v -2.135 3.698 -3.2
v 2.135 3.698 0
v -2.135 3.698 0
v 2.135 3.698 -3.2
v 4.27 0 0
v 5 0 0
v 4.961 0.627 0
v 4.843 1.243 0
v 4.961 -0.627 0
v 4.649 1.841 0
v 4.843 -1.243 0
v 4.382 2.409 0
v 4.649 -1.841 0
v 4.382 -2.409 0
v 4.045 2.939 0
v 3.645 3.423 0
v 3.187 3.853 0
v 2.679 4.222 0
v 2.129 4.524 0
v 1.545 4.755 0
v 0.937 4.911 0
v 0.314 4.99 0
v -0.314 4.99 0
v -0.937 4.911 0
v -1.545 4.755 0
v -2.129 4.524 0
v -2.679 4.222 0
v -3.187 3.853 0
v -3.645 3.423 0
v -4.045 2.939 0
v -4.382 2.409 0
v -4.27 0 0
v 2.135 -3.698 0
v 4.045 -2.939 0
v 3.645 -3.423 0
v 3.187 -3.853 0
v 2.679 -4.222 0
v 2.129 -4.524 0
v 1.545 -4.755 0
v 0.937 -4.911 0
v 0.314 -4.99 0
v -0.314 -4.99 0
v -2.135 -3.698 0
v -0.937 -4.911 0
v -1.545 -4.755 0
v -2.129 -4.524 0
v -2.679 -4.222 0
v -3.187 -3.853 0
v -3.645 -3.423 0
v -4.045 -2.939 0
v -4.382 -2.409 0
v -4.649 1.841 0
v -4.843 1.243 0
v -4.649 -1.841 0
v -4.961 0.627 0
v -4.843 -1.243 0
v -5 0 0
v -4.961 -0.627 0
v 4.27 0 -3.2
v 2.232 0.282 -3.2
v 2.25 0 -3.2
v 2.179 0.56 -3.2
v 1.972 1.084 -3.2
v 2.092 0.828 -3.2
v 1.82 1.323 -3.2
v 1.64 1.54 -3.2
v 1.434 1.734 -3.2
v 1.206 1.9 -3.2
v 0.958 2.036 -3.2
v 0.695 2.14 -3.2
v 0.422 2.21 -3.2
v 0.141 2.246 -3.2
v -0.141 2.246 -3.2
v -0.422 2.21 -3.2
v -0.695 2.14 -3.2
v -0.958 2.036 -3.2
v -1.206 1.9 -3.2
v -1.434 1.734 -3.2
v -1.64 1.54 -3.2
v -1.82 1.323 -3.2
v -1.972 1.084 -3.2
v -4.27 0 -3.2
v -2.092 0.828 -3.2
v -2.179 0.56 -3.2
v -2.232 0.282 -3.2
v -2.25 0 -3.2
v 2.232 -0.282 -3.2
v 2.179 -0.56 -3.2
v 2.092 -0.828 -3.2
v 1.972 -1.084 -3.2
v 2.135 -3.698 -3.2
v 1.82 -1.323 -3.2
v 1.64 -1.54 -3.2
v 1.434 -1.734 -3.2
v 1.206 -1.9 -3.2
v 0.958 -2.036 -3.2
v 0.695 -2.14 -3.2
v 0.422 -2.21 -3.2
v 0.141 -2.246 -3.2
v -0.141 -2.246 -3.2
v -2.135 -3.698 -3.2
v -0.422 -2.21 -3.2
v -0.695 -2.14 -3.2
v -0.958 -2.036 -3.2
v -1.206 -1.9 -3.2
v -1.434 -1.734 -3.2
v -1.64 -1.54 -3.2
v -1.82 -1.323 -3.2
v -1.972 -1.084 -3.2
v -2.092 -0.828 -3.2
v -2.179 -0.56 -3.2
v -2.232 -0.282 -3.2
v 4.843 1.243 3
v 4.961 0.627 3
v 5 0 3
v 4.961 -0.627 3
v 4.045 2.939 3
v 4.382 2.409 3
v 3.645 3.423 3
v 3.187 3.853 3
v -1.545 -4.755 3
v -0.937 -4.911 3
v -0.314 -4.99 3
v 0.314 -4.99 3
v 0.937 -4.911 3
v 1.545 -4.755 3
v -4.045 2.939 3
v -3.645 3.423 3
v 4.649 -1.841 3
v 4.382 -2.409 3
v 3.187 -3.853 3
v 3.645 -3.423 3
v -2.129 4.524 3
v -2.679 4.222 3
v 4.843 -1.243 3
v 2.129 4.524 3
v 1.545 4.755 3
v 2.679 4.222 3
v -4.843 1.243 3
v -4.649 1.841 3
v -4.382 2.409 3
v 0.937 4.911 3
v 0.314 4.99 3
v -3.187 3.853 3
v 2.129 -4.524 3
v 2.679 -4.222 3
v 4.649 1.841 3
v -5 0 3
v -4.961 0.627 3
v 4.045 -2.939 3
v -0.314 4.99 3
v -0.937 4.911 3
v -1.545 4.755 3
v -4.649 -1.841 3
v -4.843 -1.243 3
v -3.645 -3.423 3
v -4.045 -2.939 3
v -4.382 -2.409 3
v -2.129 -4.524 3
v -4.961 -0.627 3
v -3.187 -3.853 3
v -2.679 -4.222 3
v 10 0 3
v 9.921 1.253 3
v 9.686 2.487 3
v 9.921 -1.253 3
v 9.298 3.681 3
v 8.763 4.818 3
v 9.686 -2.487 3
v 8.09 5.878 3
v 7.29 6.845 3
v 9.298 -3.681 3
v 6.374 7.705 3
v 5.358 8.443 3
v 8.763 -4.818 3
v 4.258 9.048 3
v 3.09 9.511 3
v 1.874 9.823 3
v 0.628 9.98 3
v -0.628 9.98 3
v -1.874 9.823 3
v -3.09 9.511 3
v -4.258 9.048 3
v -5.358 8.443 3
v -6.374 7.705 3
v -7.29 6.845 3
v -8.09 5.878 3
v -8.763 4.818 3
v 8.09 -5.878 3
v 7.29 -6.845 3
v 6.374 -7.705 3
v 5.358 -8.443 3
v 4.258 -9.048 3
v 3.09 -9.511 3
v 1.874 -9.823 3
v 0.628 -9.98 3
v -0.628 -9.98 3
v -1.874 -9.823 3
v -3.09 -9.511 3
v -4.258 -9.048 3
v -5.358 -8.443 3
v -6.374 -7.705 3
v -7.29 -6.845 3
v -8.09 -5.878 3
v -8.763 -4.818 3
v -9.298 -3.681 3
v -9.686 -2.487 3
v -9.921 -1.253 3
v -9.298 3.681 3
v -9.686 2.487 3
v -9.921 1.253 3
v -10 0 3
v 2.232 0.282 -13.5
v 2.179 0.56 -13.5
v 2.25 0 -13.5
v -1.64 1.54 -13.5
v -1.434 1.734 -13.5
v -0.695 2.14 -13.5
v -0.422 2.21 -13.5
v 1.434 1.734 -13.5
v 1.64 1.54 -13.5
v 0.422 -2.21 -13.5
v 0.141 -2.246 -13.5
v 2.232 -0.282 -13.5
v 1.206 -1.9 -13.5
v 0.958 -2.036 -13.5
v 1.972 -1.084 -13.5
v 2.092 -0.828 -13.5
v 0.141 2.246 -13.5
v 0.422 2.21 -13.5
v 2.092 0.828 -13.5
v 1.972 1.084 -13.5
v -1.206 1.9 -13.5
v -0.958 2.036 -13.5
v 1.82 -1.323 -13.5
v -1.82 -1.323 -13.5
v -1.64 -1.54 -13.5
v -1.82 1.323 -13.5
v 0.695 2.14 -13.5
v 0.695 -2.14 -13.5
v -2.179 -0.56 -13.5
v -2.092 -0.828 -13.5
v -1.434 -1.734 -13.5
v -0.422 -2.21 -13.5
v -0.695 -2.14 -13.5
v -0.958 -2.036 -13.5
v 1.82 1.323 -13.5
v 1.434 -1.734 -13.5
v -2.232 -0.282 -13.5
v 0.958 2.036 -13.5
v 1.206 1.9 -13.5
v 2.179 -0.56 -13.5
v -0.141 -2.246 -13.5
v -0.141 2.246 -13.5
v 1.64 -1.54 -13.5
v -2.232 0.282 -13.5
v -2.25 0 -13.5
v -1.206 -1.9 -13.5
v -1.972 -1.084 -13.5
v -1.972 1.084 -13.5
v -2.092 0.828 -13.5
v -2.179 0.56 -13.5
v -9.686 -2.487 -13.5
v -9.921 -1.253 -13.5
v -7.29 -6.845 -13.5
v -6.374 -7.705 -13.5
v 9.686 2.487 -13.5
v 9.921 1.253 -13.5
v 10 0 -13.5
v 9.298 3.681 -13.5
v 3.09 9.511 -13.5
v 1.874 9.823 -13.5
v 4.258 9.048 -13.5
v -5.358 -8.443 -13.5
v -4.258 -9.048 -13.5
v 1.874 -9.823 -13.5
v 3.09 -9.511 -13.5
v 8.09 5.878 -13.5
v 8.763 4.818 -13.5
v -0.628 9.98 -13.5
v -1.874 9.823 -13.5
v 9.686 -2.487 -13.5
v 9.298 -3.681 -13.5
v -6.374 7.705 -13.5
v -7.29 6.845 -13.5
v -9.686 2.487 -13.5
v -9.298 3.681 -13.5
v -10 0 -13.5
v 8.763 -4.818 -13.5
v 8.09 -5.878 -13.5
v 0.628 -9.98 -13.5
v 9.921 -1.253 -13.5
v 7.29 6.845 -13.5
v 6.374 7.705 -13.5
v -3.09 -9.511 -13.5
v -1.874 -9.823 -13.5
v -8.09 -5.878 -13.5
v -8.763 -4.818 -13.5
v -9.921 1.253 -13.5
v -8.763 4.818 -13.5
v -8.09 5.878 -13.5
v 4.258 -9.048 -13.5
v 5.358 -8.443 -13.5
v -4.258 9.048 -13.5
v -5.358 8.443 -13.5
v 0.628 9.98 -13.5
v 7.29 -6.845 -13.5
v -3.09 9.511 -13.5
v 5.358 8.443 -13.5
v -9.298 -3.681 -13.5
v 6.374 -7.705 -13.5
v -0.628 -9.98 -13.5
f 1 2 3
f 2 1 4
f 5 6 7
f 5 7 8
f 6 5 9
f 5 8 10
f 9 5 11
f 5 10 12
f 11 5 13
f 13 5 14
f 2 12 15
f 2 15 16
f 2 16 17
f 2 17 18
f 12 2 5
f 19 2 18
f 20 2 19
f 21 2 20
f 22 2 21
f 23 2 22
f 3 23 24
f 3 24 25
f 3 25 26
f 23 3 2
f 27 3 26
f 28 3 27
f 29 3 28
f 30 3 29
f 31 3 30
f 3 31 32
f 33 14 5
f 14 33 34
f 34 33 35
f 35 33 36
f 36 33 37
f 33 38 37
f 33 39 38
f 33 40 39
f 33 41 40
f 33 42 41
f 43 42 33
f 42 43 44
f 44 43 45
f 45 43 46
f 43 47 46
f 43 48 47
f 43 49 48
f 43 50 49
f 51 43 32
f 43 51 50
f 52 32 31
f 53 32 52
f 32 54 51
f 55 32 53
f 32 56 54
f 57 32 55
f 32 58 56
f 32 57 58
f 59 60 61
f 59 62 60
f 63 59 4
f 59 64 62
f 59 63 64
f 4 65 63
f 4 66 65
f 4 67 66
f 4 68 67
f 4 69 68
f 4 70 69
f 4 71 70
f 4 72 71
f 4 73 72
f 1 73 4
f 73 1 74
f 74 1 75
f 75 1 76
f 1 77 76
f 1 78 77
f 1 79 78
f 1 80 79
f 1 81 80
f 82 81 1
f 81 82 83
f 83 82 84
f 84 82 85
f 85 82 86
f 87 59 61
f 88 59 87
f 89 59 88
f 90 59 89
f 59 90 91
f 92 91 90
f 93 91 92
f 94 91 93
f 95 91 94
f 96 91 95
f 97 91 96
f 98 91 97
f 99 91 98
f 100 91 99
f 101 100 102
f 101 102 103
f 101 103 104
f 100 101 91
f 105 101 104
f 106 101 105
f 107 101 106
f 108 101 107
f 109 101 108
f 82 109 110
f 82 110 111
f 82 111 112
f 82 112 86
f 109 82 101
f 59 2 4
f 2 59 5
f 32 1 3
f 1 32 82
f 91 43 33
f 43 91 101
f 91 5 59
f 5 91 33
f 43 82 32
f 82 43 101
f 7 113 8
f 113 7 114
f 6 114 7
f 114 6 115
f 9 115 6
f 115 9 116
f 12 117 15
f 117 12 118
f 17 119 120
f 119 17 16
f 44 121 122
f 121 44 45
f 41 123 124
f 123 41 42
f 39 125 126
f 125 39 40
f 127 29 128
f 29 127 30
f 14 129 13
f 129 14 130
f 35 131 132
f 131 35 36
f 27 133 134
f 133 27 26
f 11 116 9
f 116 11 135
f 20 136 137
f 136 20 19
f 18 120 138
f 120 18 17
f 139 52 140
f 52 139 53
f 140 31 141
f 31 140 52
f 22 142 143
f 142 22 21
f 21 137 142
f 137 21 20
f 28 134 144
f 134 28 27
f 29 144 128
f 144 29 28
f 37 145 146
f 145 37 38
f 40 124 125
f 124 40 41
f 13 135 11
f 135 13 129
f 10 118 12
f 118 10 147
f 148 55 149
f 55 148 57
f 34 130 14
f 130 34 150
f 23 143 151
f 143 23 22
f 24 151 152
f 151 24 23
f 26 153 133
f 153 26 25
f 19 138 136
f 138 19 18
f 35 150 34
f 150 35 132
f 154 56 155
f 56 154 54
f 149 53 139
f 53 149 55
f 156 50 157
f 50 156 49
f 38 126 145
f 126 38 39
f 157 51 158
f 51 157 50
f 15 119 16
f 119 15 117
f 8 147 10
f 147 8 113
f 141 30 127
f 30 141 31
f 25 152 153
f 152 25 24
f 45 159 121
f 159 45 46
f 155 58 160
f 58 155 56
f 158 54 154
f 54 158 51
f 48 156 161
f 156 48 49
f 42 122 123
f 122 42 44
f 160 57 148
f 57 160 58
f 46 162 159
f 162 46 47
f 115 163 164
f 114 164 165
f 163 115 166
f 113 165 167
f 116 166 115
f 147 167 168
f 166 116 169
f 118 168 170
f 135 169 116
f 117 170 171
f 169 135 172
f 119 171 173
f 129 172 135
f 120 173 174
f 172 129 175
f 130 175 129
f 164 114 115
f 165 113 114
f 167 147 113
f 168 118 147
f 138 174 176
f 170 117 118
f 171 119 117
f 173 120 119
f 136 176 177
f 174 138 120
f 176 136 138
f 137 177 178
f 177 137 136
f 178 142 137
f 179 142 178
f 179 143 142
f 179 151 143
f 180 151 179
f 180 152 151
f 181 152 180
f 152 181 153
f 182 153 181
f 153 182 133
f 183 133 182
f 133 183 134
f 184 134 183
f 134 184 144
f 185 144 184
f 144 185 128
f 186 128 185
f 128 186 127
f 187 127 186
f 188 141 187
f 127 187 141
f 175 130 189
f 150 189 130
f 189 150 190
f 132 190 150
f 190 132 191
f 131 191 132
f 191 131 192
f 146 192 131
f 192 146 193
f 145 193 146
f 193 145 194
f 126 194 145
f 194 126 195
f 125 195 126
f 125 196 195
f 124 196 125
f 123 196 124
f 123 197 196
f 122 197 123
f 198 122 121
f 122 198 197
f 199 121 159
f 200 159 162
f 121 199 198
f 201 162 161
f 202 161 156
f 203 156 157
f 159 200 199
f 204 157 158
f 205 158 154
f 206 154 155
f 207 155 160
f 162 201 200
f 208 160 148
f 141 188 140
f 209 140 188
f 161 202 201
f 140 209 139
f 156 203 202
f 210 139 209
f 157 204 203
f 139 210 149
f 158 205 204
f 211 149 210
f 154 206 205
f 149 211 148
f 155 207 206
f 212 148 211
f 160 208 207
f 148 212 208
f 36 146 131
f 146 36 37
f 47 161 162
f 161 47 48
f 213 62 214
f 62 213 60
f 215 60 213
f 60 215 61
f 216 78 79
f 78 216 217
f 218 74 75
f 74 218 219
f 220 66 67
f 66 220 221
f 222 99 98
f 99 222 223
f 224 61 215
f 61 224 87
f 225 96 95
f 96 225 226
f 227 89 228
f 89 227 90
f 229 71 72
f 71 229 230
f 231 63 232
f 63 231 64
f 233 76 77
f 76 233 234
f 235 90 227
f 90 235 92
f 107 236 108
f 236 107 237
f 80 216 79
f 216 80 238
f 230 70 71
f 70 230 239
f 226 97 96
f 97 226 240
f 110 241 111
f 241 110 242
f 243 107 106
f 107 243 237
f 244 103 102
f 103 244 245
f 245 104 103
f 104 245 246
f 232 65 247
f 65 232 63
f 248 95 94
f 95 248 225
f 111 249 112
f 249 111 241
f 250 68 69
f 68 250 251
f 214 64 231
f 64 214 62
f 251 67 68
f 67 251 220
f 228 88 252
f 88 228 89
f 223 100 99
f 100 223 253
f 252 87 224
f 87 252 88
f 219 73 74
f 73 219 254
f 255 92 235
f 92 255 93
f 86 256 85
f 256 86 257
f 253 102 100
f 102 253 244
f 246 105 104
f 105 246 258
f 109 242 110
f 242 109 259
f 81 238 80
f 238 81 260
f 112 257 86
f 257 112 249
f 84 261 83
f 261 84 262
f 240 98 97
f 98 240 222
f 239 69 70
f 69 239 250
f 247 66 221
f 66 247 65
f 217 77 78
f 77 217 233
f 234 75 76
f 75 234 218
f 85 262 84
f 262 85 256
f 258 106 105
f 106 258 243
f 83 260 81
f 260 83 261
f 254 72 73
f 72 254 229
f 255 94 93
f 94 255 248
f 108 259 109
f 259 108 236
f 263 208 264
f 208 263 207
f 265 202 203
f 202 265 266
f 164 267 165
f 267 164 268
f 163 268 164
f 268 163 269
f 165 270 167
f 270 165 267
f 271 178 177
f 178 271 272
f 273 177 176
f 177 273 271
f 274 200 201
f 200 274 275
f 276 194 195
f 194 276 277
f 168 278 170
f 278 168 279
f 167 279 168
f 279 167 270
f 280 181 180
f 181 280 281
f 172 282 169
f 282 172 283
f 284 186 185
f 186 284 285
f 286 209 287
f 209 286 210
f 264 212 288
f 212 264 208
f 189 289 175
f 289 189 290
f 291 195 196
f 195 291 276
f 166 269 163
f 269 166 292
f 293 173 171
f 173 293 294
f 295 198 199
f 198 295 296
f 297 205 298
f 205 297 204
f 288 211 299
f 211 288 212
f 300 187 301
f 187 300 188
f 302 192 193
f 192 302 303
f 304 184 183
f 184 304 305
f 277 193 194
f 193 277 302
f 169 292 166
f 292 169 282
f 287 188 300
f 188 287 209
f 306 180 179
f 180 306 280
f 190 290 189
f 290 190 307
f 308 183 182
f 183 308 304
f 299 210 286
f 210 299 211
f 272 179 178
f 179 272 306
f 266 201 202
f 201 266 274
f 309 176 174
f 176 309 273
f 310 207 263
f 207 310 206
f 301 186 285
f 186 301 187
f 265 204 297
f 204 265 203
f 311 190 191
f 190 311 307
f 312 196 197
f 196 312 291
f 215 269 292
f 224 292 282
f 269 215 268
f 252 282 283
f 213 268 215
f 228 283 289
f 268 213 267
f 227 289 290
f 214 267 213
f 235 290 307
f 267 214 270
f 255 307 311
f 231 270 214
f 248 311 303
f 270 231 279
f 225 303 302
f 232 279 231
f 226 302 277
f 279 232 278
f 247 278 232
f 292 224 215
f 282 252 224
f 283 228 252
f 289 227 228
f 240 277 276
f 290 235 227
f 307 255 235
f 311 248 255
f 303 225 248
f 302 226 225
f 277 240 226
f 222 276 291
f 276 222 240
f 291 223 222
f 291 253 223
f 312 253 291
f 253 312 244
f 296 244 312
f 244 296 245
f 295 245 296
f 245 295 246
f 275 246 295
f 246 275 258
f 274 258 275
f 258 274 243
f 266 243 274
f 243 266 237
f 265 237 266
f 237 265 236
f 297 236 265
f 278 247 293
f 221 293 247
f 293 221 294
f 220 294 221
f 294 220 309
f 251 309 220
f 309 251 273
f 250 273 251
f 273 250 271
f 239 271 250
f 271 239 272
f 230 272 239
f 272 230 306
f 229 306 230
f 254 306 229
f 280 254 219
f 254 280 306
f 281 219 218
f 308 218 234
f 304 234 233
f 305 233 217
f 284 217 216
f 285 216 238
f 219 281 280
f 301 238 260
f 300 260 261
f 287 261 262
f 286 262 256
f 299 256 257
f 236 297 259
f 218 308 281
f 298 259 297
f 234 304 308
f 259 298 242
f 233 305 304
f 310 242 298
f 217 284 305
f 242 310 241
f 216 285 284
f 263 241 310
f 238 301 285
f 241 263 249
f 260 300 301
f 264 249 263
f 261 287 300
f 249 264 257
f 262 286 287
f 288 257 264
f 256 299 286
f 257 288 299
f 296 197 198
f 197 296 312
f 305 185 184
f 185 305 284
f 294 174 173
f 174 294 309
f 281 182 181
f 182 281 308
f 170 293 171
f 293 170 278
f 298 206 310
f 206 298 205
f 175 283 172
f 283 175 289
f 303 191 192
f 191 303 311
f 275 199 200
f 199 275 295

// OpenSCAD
$fn = 50;

difference() {
	union() {
		translate(v = [0, 0, -13.5]) {
			cylinder(h = 16.5, r = 10.0);
		}
	}
	union() {
		translate(v = [0, 0, 0]) {
			rotate(a = [0, 0, 0]) {
				difference() {
					union() {
						translate(v = [0, 0, -3.2]) {
							linear_extrude(height = 3.2) {
								polygon(points = [[4.2698, 0.0], [2.1349000000000005, 3.697755269078796], [-2.134899999999999, 3.6977552690787965], [-4.2698, 5.228996902999369e-16], [-2.134900000000002, -3.6977552690787956], [2.1348999999999974, -3.697755269078798]]);
							}
						}
					}
					union();
				}
			}
		}
		#cylinder(h = 3, r = 5.0);
		#translate(v = [0, 0, -100.0]) {
			cylinder(h = 200, r = 2.25);
		}
	}
}
